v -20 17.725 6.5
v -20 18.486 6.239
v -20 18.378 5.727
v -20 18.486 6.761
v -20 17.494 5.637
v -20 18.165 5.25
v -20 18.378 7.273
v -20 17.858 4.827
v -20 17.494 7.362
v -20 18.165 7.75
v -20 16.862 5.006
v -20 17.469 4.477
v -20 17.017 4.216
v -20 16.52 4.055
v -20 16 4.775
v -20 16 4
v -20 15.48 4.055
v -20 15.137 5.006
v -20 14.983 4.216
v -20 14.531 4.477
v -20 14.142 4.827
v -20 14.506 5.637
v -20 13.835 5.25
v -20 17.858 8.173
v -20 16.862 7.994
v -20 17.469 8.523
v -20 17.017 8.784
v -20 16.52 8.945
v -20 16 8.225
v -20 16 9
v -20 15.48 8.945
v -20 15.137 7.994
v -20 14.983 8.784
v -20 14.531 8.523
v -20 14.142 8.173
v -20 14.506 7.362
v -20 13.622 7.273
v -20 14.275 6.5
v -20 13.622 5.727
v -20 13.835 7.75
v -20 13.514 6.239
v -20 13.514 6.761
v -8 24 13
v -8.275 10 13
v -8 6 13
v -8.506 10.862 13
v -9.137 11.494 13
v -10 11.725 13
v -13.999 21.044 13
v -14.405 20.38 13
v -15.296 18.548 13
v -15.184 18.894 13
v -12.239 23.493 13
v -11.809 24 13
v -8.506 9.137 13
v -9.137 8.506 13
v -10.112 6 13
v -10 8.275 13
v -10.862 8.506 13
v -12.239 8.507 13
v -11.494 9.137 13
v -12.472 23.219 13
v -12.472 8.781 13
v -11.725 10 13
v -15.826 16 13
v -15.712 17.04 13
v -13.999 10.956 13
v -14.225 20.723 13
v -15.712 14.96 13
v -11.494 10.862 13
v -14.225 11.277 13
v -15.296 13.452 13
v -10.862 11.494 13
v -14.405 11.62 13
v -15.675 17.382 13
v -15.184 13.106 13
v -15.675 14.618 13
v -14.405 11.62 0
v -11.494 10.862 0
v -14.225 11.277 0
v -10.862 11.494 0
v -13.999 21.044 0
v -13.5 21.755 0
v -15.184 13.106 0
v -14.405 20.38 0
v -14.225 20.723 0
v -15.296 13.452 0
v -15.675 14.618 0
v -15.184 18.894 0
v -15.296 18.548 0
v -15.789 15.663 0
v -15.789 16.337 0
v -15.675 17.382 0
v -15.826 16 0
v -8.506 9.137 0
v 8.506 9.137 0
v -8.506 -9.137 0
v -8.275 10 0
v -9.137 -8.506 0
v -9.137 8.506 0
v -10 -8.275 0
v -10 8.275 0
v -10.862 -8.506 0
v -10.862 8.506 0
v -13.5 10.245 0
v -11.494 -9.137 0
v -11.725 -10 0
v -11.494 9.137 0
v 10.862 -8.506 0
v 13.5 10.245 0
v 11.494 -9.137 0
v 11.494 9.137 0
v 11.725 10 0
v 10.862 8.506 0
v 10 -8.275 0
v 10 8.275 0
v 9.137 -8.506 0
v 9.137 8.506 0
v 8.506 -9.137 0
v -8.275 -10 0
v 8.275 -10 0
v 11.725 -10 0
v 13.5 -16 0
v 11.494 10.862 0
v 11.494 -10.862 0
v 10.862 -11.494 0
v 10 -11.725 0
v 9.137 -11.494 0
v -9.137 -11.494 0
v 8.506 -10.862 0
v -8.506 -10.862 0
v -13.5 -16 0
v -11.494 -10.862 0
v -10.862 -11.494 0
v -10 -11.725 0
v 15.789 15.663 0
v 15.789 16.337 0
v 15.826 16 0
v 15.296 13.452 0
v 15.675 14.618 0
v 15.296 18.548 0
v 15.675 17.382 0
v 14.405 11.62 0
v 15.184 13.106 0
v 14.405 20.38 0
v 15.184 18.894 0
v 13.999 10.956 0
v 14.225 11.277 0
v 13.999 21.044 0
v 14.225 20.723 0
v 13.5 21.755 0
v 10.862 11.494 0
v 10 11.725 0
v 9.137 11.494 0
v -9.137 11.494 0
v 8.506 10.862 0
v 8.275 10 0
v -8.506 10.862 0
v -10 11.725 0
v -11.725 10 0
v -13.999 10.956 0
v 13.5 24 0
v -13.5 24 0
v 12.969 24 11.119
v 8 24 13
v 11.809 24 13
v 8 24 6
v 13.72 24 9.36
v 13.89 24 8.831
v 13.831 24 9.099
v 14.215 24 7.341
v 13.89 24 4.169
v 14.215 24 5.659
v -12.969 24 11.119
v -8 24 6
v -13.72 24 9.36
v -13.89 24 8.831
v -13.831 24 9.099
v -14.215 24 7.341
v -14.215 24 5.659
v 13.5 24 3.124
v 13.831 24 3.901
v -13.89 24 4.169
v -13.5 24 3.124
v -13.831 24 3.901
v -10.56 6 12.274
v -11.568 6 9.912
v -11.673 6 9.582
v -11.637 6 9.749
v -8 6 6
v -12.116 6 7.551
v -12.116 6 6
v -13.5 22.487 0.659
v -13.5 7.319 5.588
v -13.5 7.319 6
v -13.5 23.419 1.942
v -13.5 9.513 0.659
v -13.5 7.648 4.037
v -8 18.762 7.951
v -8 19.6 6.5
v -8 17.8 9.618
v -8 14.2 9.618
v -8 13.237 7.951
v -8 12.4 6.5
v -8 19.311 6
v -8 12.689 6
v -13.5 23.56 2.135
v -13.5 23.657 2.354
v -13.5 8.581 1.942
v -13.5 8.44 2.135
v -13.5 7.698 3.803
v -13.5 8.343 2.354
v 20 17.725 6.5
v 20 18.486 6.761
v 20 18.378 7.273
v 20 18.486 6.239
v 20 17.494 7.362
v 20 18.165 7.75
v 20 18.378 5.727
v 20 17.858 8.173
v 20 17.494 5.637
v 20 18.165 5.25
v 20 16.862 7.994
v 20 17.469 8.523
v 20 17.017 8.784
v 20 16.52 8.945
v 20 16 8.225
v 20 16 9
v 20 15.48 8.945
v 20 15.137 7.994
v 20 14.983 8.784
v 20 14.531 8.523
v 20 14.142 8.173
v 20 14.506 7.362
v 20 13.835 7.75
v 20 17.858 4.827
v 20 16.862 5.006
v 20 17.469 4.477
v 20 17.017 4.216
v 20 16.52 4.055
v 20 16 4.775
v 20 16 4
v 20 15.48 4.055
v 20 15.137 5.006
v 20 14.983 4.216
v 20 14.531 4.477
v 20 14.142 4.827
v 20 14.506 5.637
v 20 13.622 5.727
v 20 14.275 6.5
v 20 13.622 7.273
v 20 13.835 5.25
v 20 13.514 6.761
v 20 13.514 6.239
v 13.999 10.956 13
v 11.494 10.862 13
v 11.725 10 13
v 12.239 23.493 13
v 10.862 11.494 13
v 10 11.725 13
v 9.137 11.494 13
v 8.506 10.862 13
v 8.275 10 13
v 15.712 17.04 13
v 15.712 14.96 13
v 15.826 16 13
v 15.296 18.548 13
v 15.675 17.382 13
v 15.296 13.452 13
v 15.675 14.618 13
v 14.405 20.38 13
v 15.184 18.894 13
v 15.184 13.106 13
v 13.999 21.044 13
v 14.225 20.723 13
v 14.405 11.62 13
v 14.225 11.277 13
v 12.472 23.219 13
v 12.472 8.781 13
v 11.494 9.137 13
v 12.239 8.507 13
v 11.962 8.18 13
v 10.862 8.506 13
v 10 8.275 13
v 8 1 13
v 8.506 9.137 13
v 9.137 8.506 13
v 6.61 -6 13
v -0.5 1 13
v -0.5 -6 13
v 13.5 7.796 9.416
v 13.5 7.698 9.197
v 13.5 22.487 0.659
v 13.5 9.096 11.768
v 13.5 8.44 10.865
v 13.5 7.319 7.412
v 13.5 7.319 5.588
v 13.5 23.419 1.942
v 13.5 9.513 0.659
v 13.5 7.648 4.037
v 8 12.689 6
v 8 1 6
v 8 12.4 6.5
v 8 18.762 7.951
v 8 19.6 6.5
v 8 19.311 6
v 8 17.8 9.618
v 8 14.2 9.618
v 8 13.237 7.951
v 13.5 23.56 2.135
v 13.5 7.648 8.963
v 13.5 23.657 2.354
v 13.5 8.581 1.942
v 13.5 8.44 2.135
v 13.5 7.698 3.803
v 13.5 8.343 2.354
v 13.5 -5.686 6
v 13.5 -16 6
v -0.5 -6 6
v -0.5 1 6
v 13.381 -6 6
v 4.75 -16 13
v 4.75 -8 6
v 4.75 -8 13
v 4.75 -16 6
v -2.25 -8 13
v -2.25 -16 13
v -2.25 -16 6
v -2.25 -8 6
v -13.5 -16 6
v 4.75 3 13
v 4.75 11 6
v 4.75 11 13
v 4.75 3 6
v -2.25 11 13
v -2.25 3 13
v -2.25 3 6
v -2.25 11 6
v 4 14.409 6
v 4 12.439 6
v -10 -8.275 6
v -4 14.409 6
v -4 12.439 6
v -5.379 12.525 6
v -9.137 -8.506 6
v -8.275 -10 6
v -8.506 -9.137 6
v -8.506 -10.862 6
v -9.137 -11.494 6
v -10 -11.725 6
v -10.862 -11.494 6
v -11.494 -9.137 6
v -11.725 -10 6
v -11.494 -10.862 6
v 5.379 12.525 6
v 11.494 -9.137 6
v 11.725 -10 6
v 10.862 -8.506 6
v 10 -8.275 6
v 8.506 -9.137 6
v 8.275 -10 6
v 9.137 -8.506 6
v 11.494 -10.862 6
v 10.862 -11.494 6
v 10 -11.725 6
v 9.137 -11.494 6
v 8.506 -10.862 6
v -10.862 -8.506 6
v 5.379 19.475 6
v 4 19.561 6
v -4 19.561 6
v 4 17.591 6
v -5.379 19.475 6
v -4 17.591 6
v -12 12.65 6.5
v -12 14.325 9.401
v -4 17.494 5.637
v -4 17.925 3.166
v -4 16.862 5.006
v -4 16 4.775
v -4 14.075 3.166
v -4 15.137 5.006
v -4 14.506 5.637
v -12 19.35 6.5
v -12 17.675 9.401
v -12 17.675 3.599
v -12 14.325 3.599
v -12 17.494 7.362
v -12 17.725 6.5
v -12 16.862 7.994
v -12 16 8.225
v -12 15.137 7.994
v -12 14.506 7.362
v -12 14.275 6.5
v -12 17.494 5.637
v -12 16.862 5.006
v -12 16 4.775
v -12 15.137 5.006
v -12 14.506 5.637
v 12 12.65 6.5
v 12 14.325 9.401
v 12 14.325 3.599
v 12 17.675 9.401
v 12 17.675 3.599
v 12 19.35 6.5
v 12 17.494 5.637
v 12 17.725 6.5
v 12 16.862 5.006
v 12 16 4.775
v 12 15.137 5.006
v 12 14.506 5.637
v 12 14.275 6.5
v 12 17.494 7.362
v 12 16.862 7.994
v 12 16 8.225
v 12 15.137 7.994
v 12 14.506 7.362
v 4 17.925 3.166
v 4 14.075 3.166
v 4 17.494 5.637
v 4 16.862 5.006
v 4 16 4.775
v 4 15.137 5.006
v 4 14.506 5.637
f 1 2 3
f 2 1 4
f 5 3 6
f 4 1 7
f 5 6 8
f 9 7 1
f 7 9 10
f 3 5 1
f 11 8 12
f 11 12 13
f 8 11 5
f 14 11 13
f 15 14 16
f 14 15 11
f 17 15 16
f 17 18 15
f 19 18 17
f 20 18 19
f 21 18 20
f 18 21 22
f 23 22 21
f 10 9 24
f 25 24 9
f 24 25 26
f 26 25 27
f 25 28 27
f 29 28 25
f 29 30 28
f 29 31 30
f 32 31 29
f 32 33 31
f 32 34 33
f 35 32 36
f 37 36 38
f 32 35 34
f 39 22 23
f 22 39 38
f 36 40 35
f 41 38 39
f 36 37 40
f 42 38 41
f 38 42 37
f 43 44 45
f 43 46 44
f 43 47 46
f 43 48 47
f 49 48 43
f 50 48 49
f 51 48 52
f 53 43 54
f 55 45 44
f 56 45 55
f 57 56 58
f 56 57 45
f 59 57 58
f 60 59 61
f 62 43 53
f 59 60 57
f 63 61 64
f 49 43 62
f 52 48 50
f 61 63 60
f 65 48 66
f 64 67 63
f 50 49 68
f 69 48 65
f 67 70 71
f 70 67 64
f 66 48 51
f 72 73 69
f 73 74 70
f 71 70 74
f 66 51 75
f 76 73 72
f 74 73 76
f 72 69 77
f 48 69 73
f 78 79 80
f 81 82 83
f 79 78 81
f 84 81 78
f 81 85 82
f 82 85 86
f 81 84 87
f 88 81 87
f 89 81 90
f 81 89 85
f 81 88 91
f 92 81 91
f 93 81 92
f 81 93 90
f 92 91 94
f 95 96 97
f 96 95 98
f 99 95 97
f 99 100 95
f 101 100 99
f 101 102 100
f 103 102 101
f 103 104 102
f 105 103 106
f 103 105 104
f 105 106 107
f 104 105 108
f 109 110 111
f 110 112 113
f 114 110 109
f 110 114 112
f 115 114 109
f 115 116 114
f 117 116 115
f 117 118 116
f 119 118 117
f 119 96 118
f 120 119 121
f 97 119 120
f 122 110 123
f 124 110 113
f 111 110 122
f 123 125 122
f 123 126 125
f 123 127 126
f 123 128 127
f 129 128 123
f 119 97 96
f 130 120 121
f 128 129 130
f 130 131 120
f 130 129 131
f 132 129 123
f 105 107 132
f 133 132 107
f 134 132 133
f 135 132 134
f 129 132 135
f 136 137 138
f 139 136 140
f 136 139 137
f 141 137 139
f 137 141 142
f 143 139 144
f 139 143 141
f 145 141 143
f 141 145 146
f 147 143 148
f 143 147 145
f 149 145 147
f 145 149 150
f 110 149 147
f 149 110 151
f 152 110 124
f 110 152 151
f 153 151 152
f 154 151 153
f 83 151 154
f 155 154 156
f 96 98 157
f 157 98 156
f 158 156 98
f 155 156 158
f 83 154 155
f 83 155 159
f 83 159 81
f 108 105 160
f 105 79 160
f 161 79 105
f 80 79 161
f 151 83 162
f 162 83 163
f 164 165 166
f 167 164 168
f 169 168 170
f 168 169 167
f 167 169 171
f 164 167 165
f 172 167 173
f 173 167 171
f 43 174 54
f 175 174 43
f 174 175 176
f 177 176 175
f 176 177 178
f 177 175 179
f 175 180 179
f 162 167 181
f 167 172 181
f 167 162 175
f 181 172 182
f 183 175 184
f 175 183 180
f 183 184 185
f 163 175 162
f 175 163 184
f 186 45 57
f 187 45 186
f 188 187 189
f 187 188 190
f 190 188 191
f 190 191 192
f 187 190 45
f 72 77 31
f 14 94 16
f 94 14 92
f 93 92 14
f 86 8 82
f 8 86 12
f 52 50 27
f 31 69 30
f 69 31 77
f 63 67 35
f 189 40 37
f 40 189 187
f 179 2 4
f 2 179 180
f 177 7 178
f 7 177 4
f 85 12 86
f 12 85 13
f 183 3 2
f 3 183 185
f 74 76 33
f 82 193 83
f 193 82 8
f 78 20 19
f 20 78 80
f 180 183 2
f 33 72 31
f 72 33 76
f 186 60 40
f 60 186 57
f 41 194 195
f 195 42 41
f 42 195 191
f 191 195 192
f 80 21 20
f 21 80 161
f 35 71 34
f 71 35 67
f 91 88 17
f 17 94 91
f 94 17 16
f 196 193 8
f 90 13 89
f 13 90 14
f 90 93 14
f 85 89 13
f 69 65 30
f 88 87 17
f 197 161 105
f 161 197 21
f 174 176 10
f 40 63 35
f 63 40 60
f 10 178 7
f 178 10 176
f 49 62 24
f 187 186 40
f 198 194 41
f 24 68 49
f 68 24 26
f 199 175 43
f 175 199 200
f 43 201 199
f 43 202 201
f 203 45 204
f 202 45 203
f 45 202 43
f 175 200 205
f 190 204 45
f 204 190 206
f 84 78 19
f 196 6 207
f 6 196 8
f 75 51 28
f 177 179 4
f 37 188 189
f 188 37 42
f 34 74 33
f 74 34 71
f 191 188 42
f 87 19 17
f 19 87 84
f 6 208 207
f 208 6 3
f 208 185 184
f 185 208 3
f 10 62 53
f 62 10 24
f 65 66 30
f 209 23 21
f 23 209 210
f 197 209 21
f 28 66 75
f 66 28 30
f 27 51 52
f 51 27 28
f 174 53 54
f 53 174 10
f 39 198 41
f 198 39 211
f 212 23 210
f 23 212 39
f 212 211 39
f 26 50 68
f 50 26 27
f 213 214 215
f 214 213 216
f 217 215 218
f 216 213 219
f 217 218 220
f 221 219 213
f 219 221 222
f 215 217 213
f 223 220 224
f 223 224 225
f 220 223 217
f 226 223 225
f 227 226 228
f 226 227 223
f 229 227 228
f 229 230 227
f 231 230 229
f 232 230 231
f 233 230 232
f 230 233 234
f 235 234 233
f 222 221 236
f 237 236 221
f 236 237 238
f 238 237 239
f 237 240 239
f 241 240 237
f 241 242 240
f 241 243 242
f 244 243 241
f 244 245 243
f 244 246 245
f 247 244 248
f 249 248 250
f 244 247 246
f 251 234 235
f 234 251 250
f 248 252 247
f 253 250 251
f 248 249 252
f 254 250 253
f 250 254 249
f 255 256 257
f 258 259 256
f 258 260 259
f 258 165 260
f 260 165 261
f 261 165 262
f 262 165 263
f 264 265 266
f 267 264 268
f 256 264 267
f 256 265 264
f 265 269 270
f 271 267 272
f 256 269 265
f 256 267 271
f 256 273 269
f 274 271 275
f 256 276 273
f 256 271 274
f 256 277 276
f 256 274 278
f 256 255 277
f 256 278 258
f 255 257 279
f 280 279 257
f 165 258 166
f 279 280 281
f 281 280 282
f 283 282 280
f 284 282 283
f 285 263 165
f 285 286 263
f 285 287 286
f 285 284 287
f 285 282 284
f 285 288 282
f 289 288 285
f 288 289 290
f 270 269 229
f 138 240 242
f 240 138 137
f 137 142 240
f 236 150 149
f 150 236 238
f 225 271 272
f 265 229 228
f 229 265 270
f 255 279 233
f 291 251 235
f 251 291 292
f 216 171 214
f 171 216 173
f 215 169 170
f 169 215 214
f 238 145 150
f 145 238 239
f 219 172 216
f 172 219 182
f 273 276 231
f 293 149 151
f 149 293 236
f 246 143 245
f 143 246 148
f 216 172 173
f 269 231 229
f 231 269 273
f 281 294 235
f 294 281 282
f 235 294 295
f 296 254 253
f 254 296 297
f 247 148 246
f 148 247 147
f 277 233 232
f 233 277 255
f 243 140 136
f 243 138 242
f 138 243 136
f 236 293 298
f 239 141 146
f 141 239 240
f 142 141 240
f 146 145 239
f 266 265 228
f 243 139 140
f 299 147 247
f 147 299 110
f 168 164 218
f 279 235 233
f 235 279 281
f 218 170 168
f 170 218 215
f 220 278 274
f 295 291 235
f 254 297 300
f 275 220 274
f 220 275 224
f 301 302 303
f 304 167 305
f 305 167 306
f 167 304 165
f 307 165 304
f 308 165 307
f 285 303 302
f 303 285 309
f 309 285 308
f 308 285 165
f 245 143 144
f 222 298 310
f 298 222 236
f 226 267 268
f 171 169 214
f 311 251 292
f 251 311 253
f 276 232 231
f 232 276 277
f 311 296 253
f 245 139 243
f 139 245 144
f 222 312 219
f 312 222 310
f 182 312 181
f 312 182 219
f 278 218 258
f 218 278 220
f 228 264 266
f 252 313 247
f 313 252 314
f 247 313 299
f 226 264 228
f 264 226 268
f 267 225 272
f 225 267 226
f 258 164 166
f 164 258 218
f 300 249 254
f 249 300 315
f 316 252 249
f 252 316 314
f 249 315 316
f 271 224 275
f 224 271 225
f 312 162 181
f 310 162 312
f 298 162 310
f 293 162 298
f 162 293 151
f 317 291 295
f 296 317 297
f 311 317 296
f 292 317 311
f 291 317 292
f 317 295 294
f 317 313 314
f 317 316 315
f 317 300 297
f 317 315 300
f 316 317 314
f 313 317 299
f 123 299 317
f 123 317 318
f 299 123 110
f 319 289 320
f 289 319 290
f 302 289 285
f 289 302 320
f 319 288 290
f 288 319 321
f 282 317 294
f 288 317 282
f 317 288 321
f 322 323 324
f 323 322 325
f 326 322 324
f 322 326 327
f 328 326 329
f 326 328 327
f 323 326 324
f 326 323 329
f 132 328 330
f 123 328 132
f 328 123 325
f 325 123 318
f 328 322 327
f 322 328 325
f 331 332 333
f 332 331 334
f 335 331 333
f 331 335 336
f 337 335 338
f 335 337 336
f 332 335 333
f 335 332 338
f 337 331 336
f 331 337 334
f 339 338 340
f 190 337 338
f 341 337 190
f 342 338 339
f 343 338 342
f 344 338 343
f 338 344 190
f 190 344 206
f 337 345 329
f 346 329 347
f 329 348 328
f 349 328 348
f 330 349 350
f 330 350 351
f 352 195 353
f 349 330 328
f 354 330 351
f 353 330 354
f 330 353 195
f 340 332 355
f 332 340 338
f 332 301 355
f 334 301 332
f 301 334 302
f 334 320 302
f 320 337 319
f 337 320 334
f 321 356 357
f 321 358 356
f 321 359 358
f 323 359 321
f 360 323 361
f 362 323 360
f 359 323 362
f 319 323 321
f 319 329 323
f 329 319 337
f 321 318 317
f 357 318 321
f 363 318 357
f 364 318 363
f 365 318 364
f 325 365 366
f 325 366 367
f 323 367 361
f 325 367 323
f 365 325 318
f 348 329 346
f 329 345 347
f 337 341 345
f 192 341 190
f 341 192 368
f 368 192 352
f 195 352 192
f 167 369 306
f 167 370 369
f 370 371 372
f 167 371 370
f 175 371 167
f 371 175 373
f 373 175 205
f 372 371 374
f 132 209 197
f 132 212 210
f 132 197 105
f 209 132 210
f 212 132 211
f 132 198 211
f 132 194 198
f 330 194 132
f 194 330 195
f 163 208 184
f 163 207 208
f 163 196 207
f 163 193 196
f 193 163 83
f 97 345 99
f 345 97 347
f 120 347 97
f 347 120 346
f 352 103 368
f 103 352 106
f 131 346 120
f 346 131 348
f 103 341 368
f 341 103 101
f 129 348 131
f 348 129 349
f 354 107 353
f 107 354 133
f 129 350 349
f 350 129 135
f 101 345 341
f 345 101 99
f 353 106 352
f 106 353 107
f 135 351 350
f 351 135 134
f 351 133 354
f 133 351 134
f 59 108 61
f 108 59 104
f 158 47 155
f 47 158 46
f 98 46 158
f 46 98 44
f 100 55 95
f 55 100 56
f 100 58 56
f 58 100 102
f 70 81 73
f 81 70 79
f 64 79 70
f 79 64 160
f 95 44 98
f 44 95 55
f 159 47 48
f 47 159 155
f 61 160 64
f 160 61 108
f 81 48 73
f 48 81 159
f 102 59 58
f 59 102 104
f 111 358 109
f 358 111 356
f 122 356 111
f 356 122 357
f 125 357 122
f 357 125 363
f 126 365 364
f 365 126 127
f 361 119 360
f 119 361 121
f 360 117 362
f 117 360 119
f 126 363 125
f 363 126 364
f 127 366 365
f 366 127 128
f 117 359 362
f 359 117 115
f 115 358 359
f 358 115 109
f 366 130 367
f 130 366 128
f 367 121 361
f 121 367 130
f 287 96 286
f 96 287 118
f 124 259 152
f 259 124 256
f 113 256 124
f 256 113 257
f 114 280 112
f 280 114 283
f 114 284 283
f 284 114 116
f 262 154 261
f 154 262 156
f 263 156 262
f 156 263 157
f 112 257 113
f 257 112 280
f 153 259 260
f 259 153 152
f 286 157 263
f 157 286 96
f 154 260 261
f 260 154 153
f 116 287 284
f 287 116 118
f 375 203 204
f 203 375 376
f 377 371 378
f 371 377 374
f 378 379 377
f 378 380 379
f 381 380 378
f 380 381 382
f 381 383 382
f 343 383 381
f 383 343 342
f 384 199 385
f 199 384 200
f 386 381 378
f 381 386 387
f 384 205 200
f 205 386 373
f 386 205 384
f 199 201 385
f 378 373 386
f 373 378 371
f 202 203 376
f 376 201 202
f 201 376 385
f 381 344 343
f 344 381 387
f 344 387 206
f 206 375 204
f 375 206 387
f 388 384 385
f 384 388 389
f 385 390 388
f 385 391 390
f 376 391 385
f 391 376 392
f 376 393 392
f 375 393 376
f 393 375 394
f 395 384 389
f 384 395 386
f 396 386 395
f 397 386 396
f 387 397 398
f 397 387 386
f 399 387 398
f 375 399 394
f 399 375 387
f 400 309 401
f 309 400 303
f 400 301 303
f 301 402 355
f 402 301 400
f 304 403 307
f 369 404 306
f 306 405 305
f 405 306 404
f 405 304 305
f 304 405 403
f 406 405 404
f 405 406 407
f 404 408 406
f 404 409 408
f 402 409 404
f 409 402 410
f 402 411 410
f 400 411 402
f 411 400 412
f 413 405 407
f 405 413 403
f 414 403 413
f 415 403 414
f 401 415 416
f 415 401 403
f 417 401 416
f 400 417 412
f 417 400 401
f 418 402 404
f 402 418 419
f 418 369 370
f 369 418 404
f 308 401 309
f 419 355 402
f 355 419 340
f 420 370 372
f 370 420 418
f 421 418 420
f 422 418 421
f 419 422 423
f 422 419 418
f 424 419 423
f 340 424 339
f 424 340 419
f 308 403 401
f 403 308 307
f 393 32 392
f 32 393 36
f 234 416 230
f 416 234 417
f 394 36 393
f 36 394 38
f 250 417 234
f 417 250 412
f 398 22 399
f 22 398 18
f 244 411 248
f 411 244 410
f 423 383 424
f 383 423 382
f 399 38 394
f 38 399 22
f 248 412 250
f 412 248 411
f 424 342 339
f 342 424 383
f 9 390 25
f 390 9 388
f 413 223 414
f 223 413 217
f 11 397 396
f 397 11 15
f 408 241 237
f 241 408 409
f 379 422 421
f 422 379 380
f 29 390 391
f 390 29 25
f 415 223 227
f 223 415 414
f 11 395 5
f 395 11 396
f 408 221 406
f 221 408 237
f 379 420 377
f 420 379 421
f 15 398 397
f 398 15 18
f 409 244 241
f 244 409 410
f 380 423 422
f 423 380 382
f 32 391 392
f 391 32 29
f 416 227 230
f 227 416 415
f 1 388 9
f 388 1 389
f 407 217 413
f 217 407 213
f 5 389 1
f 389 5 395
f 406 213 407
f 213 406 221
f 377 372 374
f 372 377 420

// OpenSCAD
// file: configuration.scad
// Increase this if your slicer or printer make holes too tight.
extra_radius = 0.1;

// OD = outside diameter, corner to corner.
m3_nut_od = 6.1;
m3_nut_radius = m3_nut_od/2 + 0.2 + extra_radius;
m3_washer_radius = 3.5 + extra_radius;

// Major diameter of metric 3mm thread.
m3_major = 2.85;
m3_radius = m3_major/2 + extra_radius;
m3_wide_radius = m3_major/2 + extra_radius + 0.2;

// NEMA17 stepper motors.
motor_shaft_diameter = 5;
motor_shaft_radius = motor_shaft_diameter/2 + extra_radius;

// Frame brackets. M3x8mm screws work best with 3.6 mm brackets.
thickness = 3.6;

// OpenBeam or Misumi. Currently only 15x15 mm, but there is a plan
// to make models more parametric and allow 20x20 mm in the future.
extrusion = 15;

// Placement for the NEMA17 stepper motors.
motor_offset = 44;
motor_length = 47;
// main file
include <configuration.scad>;

separation = 40;
thickness = 6;

horn_thickness = 13;
horn_x = 8;

belt_width = 5;
belt_x = 5.6;
belt_z = 7;

module carriage() {
  // Timing belt (up and down).
  translate([-belt_x, 0, belt_z + belt_width/2]) %
    cube([1.7, 100, belt_width], center=true);
  translate([belt_x, 0, belt_z + belt_width/2]) %
    cube([1.7, 100, belt_width], center=true);
  difference() {
    union() {
      // Main body.
      translate([0, 4, thickness/2])
        cube([27, 40, thickness], center=true);
      // Ball joint mount horns.
      for (x = [-1, 1]) {
        scale([x, 1, 1]) intersection() {
          translate([0, 15, horn_thickness/2])
            cube([separation, 18, horn_thickness], center=true);
          translate([horn_x, 16, horn_thickness/2]) rotate([0, 90, 0])
            cylinder(r1=14, r2=2.5, h=separation/2-horn_x);
        }
      }
      // Belt clamps.
      difference() {
        union() {
          translate([6.5, -2.5, horn_thickness/2+1])
            cube([14, 7, horn_thickness-2], center=true);
          translate([10.75, 2.5, horn_thickness/2+1])
            cube([5.5, 16, horn_thickness-2], center=true);
        }
        // Avoid touching diagonal push rods (carbon tube).
        translate([20, -10, 12.5]) rotate([35, 35, 30])
          cube([40, 40, 20], center=true);
      }
      for (y = [-12, 7]) {
        translate([1.25, y, horn_thickness/2+1])
          cube([7, 8, horn_thickness-2], center=true);
      }
    }
    // Screws for linear slider.
    for (x = [-10, 10]) {
      for (y = [-10, 10]) {
        translate([x, y, thickness]) #
          cylinder(r=m3_wide_radius, h=30, center=true, $fn=12);
      }
    }
    // Screws for ball joints.
    translate([0, 16, horn_thickness/2]) rotate([0, 90, 0]) #
      cylinder(r=m3_wide_radius, h=60, center=true, $fn=12);
    // Lock nuts for ball joints.
    for (x = [-1, 1]) {
      scale([x, 1, 1]) intersection() {
        translate([horn_x, 16, horn_thickness/2]) rotate([90, 0, -90])
          cylinder(r1=m3_nut_radius, r2=m3_nut_radius+0.5, h=8,
                   center=true, $fn=6);
      }
    }
  }
}

carriage();
